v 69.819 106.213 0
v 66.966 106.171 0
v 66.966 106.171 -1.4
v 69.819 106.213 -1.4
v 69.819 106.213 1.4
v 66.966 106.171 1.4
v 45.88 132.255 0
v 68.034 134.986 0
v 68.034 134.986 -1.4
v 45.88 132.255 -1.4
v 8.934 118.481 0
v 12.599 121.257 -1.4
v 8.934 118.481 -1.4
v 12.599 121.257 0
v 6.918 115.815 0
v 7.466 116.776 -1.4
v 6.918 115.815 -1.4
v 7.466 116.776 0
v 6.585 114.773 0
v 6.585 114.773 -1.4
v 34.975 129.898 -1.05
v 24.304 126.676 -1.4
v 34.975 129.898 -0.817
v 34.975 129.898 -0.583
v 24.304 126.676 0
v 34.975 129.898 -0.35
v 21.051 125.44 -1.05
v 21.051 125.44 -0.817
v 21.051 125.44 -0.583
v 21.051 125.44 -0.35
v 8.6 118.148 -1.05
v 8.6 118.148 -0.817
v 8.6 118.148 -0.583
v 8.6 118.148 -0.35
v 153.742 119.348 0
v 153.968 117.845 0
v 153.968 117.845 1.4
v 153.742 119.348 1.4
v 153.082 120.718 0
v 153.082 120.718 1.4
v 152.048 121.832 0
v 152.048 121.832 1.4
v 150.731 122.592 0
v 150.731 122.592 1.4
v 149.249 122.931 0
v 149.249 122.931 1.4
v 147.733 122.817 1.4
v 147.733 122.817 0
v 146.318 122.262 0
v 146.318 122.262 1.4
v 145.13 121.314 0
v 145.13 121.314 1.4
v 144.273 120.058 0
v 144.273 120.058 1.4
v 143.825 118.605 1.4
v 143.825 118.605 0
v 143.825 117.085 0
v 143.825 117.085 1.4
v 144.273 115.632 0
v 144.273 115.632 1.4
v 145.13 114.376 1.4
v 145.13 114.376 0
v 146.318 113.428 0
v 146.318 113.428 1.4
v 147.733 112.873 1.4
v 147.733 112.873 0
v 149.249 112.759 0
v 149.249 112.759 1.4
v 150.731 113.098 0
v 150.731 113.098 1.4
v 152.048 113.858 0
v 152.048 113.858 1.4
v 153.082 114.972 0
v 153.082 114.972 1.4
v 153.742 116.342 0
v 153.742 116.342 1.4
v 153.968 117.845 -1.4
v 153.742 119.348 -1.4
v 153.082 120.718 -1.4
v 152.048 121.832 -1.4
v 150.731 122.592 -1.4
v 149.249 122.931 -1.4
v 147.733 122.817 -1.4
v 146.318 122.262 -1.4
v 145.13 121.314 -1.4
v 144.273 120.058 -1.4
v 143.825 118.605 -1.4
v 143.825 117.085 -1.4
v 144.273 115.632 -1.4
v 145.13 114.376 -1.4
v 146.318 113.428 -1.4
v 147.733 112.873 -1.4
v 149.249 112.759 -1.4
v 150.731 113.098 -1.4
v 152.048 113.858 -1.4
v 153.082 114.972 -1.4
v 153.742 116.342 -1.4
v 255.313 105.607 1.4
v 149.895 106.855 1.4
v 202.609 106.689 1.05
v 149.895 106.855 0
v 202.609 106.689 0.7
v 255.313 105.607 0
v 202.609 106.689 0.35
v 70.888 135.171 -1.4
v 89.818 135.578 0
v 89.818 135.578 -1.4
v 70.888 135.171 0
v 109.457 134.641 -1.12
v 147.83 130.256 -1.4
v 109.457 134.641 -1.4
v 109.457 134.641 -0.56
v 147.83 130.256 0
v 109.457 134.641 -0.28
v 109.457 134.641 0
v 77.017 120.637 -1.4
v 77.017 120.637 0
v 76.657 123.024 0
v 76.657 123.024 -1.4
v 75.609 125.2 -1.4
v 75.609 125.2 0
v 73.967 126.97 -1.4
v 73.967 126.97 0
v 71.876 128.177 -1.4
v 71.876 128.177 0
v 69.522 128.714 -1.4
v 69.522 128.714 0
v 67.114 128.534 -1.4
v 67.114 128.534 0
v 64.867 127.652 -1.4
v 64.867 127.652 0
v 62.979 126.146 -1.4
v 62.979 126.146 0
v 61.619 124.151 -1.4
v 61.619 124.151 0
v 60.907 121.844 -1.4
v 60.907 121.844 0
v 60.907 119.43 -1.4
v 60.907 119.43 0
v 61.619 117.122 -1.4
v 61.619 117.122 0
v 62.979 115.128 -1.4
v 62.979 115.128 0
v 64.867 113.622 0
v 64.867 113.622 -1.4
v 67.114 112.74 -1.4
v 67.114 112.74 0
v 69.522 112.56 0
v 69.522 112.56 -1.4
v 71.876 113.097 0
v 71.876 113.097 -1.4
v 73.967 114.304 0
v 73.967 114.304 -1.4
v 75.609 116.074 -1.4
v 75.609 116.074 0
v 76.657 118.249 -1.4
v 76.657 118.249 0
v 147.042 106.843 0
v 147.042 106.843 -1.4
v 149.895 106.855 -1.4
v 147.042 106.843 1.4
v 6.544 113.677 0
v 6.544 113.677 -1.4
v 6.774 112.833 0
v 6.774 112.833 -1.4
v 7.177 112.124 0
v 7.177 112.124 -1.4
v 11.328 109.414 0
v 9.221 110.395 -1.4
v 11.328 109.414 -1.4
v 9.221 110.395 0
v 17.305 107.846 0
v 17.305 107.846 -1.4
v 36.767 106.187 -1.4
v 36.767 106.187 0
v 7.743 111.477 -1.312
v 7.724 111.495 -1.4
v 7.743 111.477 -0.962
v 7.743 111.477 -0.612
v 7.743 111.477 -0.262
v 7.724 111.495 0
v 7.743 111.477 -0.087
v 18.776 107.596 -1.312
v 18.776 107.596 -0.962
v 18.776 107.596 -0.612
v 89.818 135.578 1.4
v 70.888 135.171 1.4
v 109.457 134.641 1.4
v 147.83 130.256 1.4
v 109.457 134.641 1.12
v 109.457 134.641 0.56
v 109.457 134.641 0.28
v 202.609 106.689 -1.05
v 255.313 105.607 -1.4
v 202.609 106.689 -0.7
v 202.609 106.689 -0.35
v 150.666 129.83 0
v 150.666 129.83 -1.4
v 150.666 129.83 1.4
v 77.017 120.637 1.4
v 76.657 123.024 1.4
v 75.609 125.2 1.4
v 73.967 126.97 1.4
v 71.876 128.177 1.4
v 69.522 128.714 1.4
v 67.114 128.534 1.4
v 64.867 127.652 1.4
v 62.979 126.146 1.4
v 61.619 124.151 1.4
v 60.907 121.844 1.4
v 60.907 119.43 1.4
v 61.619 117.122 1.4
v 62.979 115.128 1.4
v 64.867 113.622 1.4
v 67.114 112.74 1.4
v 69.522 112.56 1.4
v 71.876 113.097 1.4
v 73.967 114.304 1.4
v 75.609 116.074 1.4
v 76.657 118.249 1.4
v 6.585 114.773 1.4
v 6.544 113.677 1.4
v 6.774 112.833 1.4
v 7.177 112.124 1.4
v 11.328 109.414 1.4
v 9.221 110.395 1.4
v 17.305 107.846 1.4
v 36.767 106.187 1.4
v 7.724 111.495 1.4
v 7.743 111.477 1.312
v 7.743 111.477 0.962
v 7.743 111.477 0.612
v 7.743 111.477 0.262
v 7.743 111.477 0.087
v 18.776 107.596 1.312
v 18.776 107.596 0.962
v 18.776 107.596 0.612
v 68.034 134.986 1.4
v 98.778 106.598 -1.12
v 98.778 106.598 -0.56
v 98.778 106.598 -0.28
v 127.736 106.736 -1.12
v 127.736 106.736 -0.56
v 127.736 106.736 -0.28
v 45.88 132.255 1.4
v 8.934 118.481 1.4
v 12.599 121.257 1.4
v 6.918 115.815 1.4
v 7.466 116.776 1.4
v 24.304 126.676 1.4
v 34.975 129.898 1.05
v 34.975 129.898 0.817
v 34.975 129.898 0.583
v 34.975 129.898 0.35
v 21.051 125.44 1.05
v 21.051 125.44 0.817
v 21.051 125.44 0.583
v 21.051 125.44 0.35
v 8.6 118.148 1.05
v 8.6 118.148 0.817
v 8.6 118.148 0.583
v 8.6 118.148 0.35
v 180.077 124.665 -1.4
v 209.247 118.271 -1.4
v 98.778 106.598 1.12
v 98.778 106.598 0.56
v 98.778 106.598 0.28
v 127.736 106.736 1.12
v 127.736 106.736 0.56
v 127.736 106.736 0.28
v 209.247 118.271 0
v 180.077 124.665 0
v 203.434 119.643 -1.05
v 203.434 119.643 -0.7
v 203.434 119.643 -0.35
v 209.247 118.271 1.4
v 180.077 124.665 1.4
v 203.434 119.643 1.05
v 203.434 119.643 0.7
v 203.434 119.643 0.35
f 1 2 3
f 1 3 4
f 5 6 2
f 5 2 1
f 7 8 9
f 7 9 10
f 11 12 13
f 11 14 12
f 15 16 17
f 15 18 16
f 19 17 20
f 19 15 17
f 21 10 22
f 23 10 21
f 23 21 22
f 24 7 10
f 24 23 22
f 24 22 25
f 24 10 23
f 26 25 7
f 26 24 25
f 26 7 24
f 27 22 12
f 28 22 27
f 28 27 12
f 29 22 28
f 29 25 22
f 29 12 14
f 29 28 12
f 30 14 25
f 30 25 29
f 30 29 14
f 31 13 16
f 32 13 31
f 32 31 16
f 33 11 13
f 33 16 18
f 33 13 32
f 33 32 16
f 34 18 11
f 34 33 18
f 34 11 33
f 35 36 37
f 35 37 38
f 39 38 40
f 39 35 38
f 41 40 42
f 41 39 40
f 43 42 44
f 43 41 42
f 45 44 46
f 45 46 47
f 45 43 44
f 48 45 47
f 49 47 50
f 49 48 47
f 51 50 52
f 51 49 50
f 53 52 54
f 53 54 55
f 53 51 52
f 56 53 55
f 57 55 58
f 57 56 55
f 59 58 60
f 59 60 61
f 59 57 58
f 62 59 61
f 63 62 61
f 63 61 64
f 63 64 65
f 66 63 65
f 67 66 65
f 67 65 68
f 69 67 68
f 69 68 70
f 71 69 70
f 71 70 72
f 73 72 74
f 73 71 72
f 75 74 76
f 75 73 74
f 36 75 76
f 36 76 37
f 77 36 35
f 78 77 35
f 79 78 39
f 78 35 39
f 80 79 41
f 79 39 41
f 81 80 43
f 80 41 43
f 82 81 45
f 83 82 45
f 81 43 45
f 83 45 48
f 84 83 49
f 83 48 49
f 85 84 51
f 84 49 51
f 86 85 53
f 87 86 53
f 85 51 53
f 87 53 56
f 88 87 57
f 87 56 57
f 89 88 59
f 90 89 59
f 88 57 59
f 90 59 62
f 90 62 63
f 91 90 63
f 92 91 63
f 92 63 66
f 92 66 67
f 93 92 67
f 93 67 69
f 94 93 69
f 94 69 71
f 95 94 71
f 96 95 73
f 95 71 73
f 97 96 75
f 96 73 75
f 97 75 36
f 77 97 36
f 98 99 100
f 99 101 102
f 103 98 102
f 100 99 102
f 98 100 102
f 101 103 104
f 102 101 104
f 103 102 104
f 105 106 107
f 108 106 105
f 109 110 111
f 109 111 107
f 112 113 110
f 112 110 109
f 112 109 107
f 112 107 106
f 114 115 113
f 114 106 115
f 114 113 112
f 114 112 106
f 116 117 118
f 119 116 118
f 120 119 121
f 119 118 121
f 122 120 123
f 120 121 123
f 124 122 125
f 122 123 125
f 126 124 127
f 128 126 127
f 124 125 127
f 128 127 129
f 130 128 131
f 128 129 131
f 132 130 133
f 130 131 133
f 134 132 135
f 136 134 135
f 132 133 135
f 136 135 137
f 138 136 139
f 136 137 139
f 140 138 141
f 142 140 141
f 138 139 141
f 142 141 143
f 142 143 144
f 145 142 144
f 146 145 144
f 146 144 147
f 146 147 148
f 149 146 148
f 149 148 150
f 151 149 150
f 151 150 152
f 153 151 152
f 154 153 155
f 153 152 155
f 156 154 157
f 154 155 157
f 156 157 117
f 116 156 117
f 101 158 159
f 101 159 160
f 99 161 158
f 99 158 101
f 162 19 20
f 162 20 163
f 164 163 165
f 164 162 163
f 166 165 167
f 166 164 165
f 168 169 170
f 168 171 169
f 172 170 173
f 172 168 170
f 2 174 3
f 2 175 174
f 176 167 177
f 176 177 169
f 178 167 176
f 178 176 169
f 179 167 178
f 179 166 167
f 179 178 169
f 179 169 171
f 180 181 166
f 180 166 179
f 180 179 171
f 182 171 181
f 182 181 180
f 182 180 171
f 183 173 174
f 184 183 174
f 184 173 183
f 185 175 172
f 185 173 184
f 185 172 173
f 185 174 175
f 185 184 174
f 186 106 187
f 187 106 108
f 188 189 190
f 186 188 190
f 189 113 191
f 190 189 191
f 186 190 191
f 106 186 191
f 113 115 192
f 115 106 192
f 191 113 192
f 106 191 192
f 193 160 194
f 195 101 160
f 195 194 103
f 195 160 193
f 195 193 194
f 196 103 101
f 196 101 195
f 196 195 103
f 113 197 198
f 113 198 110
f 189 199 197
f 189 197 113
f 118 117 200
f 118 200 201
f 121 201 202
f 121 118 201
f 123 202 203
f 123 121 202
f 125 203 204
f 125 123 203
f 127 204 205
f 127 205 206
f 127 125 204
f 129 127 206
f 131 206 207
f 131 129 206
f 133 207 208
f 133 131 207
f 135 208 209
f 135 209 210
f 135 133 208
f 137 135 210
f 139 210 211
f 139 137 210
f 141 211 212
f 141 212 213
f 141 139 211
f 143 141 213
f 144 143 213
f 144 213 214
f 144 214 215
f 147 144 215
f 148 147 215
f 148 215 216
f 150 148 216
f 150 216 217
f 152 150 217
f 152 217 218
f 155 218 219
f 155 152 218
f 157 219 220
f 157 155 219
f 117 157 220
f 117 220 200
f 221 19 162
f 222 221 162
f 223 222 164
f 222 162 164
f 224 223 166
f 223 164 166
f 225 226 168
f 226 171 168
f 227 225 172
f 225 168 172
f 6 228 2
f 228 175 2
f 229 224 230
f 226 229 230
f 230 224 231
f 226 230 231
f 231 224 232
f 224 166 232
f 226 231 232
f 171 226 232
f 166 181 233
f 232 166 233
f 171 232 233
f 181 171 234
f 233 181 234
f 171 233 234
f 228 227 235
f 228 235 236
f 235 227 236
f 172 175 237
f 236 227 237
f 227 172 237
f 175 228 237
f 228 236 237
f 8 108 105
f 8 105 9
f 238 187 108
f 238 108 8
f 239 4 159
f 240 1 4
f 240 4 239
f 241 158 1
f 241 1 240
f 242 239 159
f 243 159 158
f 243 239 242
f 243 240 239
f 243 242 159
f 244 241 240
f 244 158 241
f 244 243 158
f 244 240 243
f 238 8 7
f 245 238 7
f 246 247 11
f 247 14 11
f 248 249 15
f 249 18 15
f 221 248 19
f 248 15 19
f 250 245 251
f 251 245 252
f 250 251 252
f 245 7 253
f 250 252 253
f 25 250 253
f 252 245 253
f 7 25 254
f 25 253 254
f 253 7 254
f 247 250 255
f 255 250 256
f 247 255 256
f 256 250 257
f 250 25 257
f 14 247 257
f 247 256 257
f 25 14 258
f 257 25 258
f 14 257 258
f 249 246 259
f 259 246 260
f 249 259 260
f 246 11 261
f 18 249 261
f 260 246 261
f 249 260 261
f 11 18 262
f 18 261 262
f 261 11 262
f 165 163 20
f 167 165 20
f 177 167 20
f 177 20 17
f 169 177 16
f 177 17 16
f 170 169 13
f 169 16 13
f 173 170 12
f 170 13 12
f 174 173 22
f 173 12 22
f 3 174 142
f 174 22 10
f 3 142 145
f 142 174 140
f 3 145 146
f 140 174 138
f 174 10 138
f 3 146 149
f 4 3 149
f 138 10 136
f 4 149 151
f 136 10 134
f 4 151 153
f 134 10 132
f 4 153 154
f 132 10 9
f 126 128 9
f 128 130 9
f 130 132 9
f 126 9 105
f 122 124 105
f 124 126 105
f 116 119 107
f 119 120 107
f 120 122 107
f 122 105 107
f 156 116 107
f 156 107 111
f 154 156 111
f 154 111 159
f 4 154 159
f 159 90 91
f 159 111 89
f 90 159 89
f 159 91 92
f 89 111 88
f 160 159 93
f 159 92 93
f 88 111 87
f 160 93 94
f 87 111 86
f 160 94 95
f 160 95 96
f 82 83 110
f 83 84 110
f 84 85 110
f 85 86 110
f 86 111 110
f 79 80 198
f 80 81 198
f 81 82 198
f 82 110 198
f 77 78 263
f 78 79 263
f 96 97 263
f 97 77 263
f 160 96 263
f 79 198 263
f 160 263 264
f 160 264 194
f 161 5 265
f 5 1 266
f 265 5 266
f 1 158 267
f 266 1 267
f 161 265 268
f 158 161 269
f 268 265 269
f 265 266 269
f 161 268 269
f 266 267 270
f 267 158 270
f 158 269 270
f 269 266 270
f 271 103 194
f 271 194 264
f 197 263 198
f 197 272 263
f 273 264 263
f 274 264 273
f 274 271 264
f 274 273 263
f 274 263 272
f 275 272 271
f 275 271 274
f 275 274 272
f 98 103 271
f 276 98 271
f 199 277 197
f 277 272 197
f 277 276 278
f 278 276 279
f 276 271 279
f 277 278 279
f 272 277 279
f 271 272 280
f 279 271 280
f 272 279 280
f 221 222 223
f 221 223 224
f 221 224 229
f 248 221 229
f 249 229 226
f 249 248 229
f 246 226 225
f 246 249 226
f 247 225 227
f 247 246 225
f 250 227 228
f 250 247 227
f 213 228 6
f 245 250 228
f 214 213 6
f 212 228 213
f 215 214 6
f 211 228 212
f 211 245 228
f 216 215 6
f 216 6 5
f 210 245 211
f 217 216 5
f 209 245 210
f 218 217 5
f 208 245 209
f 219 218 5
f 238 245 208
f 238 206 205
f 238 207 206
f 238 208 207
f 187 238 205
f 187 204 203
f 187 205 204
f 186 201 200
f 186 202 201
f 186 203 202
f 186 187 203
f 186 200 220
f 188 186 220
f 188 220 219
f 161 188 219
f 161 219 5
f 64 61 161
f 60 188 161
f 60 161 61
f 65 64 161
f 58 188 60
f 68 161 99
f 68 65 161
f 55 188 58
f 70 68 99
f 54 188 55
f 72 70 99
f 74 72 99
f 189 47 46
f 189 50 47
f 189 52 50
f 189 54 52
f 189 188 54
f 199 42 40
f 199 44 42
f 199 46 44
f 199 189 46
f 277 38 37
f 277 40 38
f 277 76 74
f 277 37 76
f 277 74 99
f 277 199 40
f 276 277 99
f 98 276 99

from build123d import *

# Parameters (mm, degrees)
SKETCH_1_R      = 5.1
SKETCH_1_R_2    = 8.1
EXTRUDE_1_DEPTH = 1.4


with BuildPart() as part:
    # Эскиз1 → Бобышка-Вытянуть1 (new, symmetric)
    with BuildSketch(Plane.XY):
        with BuildLine():
            add(Edge.make_bspline(
                [(149.894619256, 106.85475599), (158.680275083, 106.889957075), (176.251614136, 106.916321205), (202.609661936, 106.730645333), (228.96468106, 106.292568252), (246.530526637, 105.8505877), (255.312881654, 105.606761115)],
                knots=[0.581490104, 0.581490104, 0.581490104, 0.581490104, 0.685469054, 0.789448004, 0.893426954, 0.997405904, 0.997405904, 0.997405904, 0.997405904], degree=3))
            add(Edge.make_bspline(
                [(255.312881654, 105.606761115), (246.756257413, 108.260896884), (229.544442337, 113.256971155), (203.470240893, 119.79978809), (177.1785709, 125.404416996), (159.522198848, 128.478032218), (150.666396798, 129.82962039)],
                knots=[0.00222758, 0.00222758, 0.00222758, 0.00222758, 0.106325046, 0.210422513, 0.31451998, 0.418617446, 0.418617446, 0.418617446, 0.418617446], degree=3))
            Line((150.666396798, 129.82962039), (147.830444309, 130.255907631))
            add(Edge.make_bspline(
                [(147.830444309, 130.255907631), (141.461413304, 131.198524366), (128.693359955, 132.886388705), (112.67043132, 134.461645249), (99.826968741, 135.315000175), (86.964020356, 135.731264376), (77.308341909, 135.549477481), (70.887732655, 135.171040436)],
                knots=[0.429725304, 0.429725304, 0.429725304, 0.429725304, 0.50454493, 0.579364556, 0.61677437, 0.654184183, 0.729003809, 0.729003809, 0.729003809, 0.729003809], degree=3))
            Line((70.887732655, 135.171040436), (68.034324351, 134.985663537))
            add(Edge.make_bspline(
                [(68.034324351, 134.985663537), (62.466327292, 134.590052619), (54.128766773, 133.70015523), (43.125220573, 131.802909904), (34.953776148, 129.977054104), (26.907191476, 127.675989274), (20.367980904, 125.262128549), (15.336549935, 122.888373263), (11.739560791, 120.808049659), (8.991532459, 118.696410574), (7.481749343, 116.886227925), (6.915411804, 115.858161553), (6.707897041, 115.274334726), (6.625457542, 114.936901915), (6.585428501, 114.77290226)],
                knots=[0.740090669, 0.740090669, 0.740090669, 0.740090669, 0.805048089, 0.837526799, 0.870005509, 0.902484219, 0.934962929, 0.951202284, 0.967441639, 0.983680994, 0.991800672, 0.99586051, 0.99789043, 0.999920349, 0.999920349, 0.999920349, 0.999920349], degree=3))
            add(Edge.make_bspline(
                [(6.585428501, 114.77290226), (6.563664146, 114.614273348), (6.519009347, 114.285406452), (6.51479073, 113.71087901), (6.741898783, 112.661535219), (7.660184293, 111.409854013), (9.25908473, 110.308268876), (11.044608157, 109.487380203), (12.922194441, 108.850067694), (15.490126457, 108.172753601), (18.768502962, 107.558568007), (22.745443376, 107.043168294), (28.077313003, 106.557350362), (34.7695904, 106.213470375), (42.813490811, 106.037235573), (50.86267748, 106.006056339), (58.913615572, 106.062256394), (64.282042193, 106.132538161), (66.96601172, 106.171159397)],
                knots=[8.1168e-05, 8.1168e-05, 8.1168e-05, 8.1168e-05, 0.0020673, 0.004053433, 0.008025699, 0.015970231, 0.023914763, 0.031859294, 0.039803826, 0.047748358, 0.063637421, 0.079526485, 0.095415548, 0.127193675, 0.158971802, 0.190749929, 0.222528056, 0.254306183, 0.254306183, 0.254306183, 0.254306183], degree=3))
            Line((66.96601172, 106.171159397), (69.819069007, 106.21341025))
            add(Edge.make_bspline(
                [(69.819069007, 106.21341025), (76.253856733, 106.311006841), (85.904794849, 106.472137373), (98.777945674, 106.610759512), (111.6511009, 106.649514986), (127.735402572, 106.732475133), (140.606952957, 106.813706415), (147.042263767, 106.84262009)],
                knots=[0.265565078, 0.265565078, 0.265565078, 0.265565078, 0.341733085, 0.379817088, 0.417901091, 0.494069098, 0.570237104, 0.570237104, 0.570237104, 0.570237104], degree=3))
            Line((147.042263767, 106.84262009), (149.894619256, 106.85475599))
        make_face()
        with Locations((148.868108764, 117.844985284)):
            Circle(SKETCH_1_R, mode=Mode.SUBTRACT)
        with Locations((68.916842603, 120.636945021)):
            Circle(SKETCH_1_R_2, mode=Mode.SUBTRACT)
    extrude(amount=EXTRUDE_1_DEPTH, both=True)


solid = part.part
